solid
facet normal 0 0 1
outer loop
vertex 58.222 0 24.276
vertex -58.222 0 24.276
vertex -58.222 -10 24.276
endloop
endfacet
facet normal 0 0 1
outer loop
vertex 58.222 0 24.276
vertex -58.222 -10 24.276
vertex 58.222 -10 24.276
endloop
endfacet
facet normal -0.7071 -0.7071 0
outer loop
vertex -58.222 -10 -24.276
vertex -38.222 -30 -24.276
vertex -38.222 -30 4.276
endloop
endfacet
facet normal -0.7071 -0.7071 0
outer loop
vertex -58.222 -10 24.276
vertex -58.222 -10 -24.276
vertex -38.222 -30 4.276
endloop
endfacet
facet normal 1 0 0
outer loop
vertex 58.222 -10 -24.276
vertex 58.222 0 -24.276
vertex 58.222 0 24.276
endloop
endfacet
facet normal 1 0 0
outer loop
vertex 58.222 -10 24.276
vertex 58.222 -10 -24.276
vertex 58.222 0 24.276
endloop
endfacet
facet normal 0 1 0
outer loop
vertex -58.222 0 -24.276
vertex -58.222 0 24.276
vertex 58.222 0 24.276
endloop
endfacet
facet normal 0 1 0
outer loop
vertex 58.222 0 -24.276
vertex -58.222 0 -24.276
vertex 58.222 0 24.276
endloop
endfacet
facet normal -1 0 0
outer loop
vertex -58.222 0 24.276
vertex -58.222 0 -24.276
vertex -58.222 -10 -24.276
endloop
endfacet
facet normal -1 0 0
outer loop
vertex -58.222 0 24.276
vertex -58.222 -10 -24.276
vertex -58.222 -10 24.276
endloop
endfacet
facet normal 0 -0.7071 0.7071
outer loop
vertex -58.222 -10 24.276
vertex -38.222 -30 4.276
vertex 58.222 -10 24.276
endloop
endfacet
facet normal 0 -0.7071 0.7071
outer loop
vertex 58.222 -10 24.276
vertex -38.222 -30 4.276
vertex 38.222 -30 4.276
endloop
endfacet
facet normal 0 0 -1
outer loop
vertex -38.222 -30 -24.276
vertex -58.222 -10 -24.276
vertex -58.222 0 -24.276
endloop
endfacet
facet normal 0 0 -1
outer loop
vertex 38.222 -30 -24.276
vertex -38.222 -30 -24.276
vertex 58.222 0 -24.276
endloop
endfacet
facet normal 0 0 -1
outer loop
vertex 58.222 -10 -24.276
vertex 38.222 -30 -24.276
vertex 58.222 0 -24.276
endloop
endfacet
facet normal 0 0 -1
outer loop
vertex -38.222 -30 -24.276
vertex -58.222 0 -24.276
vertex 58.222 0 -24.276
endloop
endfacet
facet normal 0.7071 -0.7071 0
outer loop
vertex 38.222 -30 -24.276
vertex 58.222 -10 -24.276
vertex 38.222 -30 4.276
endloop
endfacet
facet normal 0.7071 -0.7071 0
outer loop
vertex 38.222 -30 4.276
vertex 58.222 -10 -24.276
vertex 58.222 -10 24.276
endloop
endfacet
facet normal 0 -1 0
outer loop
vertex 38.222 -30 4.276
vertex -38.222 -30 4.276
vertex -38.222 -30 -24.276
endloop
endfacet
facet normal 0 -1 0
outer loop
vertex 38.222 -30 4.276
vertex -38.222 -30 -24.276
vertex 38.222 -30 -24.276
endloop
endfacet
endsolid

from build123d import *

# Parameters (mm, degrees)
F0_W     = 116.443158
F0_H     = 48.552304
F1_DEPTH = 30
F2_SIZE  = 20
F3_SIZE  = 20


with BuildPart() as f1:
    # F0 (on Front) → F1 (new body)
    with BuildSketch(Plane.XZ):
        Rectangle(F0_W, F0_H)
    extrude(amount=F1_DEPTH)

    # F2
    f2_edges = [f1.edges().sort_by_distance(p)[0] for p in [
        (0, -30, 24.276152),
    ]]
    chamfer(f2_edges, length=F2_SIZE)

    # F3
    f3_edges = [f1.edges().sort_by_distance(p)[0] for p in [
        (-58.221579, -30, -10),
        (58.221579, -30, -10),
    ]]
    chamfer(f3_edges, length=F3_SIZE)


solid = f1.part
